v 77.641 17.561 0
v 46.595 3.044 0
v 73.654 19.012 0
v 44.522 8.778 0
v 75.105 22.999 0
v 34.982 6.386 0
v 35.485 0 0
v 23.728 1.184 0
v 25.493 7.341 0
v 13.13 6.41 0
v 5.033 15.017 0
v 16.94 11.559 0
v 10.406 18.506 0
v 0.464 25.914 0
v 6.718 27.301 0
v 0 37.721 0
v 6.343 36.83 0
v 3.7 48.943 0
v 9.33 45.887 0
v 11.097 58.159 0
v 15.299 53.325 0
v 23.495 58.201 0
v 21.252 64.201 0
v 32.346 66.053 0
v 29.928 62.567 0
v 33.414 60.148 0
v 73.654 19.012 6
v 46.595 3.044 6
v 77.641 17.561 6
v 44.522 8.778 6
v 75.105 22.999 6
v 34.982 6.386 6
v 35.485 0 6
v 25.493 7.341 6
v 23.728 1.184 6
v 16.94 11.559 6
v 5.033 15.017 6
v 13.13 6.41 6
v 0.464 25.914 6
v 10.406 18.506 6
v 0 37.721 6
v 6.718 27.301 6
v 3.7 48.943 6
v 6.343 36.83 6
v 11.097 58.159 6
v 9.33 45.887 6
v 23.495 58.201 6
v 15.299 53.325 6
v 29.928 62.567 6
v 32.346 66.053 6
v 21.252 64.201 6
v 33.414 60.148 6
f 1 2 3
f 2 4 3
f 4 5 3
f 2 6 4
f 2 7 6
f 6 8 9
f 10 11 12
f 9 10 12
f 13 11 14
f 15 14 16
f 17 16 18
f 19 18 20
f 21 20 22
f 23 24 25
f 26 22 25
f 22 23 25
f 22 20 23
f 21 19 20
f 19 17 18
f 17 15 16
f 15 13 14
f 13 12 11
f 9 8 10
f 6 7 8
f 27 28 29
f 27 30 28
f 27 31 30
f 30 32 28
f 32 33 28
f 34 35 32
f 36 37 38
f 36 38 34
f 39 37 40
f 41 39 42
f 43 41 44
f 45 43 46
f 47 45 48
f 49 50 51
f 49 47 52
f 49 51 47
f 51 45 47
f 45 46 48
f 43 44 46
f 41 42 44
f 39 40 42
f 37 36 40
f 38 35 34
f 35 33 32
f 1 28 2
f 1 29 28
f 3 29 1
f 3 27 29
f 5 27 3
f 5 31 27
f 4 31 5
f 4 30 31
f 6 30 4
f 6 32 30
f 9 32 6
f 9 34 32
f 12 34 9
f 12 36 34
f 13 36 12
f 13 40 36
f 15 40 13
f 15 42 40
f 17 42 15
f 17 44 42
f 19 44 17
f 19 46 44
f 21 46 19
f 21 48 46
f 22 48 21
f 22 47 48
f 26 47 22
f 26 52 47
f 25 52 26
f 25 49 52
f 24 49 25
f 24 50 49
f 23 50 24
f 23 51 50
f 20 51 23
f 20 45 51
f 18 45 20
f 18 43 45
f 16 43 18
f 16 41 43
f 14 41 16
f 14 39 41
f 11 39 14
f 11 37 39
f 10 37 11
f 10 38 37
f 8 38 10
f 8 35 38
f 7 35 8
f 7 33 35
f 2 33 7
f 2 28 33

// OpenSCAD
$fn = 32;

// ----------------------------------------------------------------------
// Hook plate: curl radius 30 mm over 205 degrees, 6 mm thick band
// ----------------------------------------------------------------------

// --- parameters (mm) ---
profile_height = 6;       // extrusion height
profile_points = 26;      // points of the closed outline

profile = [[29.928, 62.567], [32.346, 66.053], [21.252, 64.201], [11.097, 58.159], [3.7, 48.943], [0, 37.721], [0.464, 25.914], [5.033, 15.017], [13.13, 6.41], [23.728, 1.184], [35.485, 0], [46.595, 3.044], [77.641, 17.561], [73.654, 19.012], [75.105, 22.999], [44.522, 8.778], [34.982, 6.386], [25.493, 7.341], [16.94, 11.559], [10.406, 18.506], [6.718, 27.301], [6.343, 36.83], [9.33, 45.887], [15.299, 53.325], [23.495, 58.201], [33.414, 60.148]];  // single closed polygon, 26 points, counter clockwise

// --- the one profile operation ---
linear_extrude(height = profile_height) polygon(points = profile);
